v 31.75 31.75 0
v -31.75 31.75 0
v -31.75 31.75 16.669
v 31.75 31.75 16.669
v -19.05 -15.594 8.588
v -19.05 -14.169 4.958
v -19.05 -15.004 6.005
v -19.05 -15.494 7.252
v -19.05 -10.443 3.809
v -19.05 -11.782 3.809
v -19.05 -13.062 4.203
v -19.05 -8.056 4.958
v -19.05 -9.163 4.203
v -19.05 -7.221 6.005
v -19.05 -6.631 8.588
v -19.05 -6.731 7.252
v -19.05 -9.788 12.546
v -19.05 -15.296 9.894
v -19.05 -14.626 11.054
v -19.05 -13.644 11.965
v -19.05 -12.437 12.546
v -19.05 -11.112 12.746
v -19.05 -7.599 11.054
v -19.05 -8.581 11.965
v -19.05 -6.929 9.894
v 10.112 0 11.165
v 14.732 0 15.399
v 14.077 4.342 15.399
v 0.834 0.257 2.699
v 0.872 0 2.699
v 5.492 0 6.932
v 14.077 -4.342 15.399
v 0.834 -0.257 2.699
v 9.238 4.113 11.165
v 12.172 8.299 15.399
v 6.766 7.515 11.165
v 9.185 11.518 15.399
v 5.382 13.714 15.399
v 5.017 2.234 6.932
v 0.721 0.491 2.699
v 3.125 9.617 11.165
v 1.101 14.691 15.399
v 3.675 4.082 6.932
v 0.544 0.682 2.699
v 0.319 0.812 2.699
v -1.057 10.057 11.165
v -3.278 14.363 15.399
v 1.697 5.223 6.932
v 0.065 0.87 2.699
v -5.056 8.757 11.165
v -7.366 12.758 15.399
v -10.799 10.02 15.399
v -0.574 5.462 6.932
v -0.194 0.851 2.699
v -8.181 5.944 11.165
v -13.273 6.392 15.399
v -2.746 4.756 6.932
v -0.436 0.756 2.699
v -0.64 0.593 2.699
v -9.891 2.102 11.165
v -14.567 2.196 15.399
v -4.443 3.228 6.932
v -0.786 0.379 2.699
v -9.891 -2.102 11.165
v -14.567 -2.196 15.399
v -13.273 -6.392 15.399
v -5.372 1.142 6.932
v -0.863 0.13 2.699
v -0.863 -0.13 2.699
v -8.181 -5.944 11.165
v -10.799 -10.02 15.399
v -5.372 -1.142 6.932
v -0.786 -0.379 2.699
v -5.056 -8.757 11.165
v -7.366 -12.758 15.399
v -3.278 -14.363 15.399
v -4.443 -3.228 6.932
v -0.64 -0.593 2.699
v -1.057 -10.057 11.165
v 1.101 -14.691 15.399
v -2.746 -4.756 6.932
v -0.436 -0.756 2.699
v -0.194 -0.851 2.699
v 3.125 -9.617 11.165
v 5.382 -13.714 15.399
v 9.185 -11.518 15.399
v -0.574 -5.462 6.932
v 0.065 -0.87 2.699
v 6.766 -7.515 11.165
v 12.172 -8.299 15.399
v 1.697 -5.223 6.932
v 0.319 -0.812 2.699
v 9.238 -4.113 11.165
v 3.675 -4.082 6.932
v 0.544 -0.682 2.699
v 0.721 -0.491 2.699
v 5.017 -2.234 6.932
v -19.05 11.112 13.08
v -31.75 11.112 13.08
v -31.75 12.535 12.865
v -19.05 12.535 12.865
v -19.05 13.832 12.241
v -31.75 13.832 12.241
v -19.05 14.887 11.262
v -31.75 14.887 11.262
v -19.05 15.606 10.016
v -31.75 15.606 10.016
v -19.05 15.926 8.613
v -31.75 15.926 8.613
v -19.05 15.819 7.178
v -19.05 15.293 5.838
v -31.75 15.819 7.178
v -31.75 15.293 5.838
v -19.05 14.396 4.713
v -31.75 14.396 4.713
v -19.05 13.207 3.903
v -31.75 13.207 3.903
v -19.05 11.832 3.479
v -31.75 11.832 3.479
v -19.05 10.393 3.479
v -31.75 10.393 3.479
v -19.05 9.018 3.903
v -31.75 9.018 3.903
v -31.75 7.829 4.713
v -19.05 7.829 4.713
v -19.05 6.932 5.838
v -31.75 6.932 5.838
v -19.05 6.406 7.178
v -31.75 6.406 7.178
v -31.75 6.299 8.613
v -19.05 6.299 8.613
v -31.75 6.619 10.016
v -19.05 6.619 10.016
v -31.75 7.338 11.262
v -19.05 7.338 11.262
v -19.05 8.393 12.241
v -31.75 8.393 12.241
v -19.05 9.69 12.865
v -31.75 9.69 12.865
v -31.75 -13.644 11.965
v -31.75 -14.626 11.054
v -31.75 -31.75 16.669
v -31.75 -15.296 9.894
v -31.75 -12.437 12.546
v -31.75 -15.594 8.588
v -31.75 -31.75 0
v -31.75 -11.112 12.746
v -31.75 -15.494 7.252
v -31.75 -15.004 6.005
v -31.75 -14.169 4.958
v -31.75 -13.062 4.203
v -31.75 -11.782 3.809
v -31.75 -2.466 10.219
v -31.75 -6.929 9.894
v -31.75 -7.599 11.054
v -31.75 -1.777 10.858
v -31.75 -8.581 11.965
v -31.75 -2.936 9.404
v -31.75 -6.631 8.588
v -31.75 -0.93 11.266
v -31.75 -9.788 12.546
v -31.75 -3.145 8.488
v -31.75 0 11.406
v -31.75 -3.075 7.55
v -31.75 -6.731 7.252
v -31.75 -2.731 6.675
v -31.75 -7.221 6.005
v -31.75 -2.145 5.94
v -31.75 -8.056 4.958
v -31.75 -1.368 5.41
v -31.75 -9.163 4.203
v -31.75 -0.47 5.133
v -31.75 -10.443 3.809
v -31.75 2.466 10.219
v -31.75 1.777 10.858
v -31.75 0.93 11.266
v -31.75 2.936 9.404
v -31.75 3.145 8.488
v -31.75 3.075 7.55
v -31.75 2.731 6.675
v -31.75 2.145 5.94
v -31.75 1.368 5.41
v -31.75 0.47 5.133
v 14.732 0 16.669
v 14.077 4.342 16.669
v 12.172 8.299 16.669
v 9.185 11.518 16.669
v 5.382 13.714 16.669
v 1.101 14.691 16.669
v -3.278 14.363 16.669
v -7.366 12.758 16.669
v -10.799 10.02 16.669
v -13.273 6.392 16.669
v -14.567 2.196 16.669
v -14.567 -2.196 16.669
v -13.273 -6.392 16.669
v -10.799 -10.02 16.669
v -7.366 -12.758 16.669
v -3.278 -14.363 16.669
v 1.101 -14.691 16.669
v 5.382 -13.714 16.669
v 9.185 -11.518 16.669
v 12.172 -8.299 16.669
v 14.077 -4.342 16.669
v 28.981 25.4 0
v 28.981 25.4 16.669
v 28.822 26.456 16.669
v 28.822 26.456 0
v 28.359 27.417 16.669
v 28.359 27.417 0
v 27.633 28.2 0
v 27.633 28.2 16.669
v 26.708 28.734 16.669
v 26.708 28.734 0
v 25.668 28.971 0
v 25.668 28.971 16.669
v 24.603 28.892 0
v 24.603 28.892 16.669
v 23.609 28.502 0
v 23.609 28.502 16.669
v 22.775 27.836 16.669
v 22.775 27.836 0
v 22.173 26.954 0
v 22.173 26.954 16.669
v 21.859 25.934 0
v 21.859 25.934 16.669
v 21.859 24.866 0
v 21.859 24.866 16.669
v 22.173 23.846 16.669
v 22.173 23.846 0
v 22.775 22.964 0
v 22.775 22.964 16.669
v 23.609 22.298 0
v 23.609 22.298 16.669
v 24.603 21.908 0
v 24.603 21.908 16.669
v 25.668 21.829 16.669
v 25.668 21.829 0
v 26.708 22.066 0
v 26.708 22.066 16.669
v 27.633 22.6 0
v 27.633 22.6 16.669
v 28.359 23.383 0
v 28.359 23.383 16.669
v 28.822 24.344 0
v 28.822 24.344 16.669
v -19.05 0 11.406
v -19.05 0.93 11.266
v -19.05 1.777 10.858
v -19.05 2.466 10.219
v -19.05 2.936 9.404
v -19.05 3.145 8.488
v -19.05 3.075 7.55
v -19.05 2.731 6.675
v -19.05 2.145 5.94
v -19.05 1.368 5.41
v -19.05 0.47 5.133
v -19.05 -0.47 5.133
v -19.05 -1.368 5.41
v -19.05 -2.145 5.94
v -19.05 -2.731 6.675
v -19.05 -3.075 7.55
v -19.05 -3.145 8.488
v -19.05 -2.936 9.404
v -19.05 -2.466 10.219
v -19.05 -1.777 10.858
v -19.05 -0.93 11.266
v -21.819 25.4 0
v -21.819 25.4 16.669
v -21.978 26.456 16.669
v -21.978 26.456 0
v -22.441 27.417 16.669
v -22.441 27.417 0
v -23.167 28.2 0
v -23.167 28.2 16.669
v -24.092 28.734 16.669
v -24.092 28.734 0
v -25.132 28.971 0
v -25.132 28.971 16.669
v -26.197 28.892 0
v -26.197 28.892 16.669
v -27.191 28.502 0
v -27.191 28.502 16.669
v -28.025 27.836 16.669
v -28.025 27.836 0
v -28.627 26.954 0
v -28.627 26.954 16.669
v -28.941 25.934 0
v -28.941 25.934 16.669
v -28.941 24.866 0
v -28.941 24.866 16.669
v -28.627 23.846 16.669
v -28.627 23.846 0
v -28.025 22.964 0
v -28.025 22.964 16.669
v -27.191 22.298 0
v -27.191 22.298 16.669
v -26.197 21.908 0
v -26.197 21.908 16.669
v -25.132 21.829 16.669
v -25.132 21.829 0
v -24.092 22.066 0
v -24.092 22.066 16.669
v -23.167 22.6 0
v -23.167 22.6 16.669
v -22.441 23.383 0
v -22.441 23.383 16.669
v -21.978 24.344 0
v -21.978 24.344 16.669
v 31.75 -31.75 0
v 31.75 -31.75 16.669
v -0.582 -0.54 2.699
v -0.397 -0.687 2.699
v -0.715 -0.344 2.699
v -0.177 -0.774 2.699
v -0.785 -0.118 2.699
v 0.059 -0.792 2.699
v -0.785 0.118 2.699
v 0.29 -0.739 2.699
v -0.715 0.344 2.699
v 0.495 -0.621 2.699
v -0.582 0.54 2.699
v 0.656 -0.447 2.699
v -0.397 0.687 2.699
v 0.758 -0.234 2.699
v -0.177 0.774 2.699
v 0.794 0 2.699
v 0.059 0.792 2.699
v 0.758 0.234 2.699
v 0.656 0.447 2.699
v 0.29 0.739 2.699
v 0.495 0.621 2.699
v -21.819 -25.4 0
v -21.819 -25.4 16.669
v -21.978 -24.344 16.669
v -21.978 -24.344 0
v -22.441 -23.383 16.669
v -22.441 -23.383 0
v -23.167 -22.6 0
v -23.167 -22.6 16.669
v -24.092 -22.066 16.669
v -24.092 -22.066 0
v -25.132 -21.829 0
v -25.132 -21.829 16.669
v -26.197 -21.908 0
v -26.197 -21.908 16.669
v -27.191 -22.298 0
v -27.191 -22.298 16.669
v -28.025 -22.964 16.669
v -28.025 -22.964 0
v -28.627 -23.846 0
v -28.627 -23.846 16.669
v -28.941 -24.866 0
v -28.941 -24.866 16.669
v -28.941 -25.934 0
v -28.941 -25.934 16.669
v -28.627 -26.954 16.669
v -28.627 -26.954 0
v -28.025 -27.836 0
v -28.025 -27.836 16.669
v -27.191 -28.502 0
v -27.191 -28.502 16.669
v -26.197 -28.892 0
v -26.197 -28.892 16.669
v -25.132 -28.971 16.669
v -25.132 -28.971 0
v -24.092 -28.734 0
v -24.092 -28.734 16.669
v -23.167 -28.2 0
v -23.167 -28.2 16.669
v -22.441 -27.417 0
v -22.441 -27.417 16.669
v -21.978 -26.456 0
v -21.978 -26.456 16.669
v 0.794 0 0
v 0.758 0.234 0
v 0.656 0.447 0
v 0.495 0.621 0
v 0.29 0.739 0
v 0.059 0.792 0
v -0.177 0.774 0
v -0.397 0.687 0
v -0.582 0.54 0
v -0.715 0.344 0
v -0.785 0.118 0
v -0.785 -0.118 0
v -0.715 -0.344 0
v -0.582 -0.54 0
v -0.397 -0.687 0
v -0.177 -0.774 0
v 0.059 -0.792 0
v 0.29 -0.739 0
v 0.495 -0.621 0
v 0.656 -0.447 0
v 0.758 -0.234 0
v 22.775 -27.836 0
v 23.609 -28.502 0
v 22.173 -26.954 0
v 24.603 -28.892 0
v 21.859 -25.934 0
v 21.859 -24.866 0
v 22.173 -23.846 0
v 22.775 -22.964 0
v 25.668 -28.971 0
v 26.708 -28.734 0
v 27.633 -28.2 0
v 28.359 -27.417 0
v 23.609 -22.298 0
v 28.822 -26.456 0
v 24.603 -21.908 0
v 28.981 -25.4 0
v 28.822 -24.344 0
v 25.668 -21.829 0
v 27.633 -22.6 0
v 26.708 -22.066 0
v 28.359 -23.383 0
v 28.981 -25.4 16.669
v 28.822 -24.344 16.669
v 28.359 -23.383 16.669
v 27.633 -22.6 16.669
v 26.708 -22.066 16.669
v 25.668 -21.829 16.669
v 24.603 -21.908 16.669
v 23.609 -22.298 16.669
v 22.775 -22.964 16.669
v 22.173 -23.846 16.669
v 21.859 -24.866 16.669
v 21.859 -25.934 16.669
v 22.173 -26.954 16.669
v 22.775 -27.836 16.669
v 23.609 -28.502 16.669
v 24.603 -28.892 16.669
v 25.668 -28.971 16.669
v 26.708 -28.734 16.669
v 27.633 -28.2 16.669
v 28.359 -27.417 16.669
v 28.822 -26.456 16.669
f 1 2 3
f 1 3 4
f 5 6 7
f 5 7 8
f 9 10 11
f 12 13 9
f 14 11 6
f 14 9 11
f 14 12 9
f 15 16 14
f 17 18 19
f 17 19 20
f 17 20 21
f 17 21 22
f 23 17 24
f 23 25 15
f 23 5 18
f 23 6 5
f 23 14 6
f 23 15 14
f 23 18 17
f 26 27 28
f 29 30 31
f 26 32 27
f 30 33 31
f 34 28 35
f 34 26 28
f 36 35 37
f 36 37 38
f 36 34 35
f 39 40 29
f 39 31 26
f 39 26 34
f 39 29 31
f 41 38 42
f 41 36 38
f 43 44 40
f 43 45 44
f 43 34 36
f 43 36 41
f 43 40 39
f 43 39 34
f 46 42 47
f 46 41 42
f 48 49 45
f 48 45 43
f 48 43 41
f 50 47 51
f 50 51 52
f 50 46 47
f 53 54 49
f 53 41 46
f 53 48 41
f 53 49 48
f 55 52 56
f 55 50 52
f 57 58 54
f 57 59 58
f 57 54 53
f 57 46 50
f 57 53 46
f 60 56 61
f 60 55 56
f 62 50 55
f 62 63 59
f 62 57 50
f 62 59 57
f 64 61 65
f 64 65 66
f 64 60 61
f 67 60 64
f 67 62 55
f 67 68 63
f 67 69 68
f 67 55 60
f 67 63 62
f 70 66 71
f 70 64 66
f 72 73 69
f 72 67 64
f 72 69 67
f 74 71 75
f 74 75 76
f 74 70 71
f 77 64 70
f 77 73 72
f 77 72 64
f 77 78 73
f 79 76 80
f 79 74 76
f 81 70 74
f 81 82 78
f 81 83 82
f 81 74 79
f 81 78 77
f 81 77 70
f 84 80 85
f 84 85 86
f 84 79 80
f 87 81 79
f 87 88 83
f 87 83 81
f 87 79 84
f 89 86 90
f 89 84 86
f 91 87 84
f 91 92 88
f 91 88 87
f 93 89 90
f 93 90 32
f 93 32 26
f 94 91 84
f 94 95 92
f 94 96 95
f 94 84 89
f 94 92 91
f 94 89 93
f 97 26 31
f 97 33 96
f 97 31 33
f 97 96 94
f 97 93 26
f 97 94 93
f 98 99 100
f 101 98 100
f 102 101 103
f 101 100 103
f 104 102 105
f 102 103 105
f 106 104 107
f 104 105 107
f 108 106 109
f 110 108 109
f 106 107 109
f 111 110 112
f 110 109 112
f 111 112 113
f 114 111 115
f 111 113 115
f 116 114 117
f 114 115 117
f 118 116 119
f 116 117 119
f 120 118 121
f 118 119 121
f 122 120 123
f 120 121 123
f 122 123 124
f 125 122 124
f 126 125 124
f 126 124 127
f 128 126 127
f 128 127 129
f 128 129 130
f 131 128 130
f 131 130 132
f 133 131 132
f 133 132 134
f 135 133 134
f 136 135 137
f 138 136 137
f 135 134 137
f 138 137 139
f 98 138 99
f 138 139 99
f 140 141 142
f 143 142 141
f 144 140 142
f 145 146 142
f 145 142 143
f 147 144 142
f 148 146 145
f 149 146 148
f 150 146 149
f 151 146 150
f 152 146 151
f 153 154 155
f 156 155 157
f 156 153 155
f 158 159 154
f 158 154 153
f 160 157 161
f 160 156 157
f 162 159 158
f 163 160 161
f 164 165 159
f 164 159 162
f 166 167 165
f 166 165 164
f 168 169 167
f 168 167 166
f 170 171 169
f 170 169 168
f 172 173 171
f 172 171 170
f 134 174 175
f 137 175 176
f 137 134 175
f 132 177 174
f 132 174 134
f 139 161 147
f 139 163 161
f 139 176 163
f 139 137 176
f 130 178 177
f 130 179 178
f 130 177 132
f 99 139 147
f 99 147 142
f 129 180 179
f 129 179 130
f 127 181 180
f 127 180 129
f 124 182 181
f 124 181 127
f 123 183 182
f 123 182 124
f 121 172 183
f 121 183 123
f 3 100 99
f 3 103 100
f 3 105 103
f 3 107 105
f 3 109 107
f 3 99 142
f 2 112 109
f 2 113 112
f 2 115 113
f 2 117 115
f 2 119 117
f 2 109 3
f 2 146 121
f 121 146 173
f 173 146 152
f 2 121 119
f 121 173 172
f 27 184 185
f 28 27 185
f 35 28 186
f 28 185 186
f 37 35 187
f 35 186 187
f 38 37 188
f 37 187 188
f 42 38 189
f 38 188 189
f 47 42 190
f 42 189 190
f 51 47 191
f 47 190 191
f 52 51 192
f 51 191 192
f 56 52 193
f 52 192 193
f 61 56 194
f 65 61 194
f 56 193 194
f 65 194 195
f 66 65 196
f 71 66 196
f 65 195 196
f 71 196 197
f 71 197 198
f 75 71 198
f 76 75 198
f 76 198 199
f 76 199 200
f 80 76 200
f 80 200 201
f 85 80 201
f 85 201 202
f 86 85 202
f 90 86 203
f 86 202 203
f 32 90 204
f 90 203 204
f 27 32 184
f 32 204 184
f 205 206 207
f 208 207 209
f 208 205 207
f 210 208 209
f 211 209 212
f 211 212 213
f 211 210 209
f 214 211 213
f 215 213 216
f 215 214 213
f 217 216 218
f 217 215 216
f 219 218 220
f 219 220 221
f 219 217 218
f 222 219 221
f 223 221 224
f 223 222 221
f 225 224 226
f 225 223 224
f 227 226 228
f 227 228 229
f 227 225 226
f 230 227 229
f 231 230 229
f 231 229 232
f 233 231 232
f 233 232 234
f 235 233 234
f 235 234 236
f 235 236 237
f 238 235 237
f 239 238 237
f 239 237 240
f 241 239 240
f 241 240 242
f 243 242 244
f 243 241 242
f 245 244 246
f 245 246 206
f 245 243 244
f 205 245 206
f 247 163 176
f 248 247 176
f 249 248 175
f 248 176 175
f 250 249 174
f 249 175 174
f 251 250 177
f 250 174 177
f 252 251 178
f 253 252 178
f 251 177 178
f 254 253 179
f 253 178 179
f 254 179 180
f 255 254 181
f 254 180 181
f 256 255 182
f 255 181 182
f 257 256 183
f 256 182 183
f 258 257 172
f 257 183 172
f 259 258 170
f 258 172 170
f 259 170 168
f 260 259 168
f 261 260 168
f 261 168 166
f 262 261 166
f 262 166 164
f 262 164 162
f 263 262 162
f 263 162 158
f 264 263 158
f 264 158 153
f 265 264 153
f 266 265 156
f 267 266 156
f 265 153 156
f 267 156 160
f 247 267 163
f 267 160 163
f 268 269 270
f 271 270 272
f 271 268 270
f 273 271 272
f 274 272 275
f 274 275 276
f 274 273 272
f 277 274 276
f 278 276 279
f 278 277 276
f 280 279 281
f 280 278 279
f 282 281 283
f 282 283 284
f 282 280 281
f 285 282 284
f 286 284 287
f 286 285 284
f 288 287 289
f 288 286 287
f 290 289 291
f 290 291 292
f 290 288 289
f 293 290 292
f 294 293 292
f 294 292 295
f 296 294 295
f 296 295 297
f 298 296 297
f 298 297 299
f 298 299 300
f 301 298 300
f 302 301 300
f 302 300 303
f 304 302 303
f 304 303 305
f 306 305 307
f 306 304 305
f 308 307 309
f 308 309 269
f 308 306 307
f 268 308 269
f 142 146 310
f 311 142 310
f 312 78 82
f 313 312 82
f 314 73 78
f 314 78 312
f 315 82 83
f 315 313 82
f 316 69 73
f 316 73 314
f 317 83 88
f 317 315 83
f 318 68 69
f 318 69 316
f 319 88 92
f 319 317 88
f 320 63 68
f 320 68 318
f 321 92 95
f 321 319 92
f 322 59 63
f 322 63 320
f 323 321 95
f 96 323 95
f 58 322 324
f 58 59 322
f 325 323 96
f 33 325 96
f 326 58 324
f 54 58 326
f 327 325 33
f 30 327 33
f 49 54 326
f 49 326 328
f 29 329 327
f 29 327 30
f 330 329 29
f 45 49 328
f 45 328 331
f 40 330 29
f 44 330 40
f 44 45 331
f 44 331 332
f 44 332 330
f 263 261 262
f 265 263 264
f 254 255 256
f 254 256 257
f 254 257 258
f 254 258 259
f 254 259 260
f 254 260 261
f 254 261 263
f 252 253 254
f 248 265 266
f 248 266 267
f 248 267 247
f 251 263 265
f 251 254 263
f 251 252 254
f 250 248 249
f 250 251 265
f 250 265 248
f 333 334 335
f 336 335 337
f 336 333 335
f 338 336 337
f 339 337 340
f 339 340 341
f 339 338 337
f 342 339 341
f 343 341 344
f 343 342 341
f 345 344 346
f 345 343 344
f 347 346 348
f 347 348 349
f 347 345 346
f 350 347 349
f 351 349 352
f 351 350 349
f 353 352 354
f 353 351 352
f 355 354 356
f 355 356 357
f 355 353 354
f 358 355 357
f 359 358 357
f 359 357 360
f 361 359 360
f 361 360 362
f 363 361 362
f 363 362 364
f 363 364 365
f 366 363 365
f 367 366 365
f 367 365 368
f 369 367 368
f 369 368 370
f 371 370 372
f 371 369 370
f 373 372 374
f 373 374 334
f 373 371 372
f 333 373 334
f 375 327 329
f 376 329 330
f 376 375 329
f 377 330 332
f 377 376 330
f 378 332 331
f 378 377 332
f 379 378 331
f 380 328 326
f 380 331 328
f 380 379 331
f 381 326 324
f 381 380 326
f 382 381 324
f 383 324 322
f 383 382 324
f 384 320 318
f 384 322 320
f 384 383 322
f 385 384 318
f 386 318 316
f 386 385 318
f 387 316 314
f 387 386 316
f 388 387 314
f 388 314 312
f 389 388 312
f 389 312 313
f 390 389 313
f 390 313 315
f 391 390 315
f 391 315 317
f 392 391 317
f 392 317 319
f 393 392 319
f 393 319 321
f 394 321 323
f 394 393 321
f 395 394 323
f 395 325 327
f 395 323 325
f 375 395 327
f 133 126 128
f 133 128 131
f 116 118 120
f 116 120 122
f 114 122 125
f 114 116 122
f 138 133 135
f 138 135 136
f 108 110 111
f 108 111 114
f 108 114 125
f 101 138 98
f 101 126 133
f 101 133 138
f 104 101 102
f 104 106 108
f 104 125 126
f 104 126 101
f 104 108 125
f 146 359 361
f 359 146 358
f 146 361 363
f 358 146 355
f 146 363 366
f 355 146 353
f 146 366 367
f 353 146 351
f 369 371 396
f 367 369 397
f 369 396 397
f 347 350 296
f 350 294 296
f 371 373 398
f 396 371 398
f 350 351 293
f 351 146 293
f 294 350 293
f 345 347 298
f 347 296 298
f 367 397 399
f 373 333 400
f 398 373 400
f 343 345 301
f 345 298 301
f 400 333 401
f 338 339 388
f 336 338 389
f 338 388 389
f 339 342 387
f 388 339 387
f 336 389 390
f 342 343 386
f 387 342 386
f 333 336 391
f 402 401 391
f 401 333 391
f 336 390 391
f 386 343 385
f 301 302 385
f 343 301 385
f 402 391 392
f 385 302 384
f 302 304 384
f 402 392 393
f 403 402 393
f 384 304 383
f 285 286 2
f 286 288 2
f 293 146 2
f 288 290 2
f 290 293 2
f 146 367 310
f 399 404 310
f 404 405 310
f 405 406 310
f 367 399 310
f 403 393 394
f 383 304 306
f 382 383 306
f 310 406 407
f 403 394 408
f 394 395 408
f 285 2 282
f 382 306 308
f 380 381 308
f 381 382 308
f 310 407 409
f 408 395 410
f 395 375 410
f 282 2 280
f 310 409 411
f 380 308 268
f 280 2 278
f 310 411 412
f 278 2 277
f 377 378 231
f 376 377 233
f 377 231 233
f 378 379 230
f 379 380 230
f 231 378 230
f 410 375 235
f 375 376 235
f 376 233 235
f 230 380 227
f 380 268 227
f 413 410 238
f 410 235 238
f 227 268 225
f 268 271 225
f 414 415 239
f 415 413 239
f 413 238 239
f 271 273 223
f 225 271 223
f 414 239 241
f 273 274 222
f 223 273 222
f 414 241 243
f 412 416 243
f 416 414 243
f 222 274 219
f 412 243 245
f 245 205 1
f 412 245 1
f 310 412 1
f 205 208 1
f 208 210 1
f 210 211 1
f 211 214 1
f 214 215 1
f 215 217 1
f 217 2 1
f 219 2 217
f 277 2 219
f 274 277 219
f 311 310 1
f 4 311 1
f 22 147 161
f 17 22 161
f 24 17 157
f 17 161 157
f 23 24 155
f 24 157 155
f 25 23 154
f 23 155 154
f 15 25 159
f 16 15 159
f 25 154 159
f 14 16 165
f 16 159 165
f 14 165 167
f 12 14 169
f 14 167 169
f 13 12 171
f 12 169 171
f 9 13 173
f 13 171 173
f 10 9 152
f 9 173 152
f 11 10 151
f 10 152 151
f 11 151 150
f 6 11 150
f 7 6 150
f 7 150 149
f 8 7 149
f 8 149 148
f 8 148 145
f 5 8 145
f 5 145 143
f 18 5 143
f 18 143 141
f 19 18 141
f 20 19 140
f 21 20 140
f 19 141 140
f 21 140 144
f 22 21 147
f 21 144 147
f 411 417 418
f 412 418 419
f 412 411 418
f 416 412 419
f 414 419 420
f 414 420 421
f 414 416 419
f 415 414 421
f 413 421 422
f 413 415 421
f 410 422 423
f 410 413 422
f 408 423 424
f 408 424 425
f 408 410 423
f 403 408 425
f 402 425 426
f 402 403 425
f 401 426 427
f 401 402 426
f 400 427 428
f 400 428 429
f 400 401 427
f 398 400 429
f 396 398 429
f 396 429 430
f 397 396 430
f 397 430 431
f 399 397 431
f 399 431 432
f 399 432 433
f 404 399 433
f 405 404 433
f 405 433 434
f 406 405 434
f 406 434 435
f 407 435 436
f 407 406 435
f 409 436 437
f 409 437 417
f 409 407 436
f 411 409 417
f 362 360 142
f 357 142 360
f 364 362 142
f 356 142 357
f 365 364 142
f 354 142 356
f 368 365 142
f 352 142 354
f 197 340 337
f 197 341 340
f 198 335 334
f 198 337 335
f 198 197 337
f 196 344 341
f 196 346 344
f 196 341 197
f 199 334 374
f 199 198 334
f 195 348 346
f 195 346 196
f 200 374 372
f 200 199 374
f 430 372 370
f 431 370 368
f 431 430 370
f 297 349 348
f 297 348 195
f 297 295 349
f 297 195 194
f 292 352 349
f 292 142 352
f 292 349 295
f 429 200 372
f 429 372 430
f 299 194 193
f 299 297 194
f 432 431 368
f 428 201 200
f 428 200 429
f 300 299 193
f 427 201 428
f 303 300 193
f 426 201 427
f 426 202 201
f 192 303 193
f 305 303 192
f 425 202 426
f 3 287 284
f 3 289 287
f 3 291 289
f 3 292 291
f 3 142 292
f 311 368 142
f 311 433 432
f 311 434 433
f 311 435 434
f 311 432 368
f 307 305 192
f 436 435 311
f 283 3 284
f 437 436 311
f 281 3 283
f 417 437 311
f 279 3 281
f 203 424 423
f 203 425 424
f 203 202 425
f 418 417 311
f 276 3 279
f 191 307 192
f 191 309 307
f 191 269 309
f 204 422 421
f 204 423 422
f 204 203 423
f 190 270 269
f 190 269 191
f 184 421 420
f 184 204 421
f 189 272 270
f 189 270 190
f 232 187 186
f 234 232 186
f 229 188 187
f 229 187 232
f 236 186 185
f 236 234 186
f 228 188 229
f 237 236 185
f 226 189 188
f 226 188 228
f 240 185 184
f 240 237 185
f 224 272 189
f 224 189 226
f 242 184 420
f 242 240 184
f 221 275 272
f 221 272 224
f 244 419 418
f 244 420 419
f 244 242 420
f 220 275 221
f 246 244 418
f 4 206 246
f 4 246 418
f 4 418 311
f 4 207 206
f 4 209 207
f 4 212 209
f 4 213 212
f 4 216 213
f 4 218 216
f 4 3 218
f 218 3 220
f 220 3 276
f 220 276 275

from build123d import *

# Parameters (mm, degrees)
SKETCH1_W                   = 63.5
SKETCH1_H                   = 63.5
SKETCH1_R                   = 0.79375
SKETCH1_R_2                 = 3.5814
BOSS_EXTRUDE1_DEPTH         = 16.66875
SKETCH2_R                   = 14.732
CUT_EXTRUDE1_DEPTH          = 1.27
SKETCH3_R                   = 4.827467581
SKETCH3_R_2                 = 3.154053727
SKETCH3_R_3                 = 4.493756986
CARTIDGE_HEATER_DEPTH_DEPTH = 12.7
SKETCH4_R                   = 14.732
CUT_EXTRUDE3_DEPTH          = 12.7
CUT_EXTRUDE3_TAPER          = 47.5


with BuildPart() as part:
    # Sketch1 → Boss-Extrude1 (new body)
    with BuildSketch(Plane.XY):
        Rectangle(SKETCH1_W, SKETCH1_H)
        Circle(SKETCH1_R, mode=Mode.SUBTRACT)
        with Locations((-25.4, 25.4)):
            Circle(SKETCH1_R_2, mode=Mode.SUBTRACT)
        with Locations((25.4, 25.4)):
            Circle(SKETCH1_R_2, mode=Mode.SUBTRACT)
        with Locations((25.4, -25.4)):
            Circle(SKETCH1_R_2, mode=Mode.SUBTRACT)
        with Locations((-25.4, -25.4)):
            Circle(SKETCH1_R_2, mode=Mode.SUBTRACT)
    extrude(amount=BOSS_EXTRUDE1_DEPTH)

    # Sketch2 → Cut-Extrude1 (cut)
    with BuildSketch(Plane.XY.offset(16.66875)):
        Circle(SKETCH2_R)
    extrude(amount=-CUT_EXTRUDE1_DEPTH, mode=Mode.SUBTRACT)

    # Sketch3 → Cartidge heater (??? depth) (cut)
    with BuildSketch(Plane.ZY.offset(31.75)):
        with Locations((8.252073855, 11.1125)):
            Circle(SKETCH3_R)
        with Locations((8.252073855, 0)):
            Circle(SKETCH3_R_2)
        with Locations((8.252073855, -11.1125)):
            Circle(SKETCH3_R_3)
    extrude(amount=-CARTIDGE_HEATER_DEPTH_DEPTH, mode=Mode.SUBTRACT)

    # Sketch4 → Cut-Extrude3 (cut)
    with BuildSketch(Plane.XY.offset(15.39875)):
        Circle(SKETCH4_R)
    extrude(amount=-CUT_EXTRUDE3_DEPTH, taper=CUT_EXTRUDE3_TAPER, mode=Mode.SUBTRACT)


solid = part.part
